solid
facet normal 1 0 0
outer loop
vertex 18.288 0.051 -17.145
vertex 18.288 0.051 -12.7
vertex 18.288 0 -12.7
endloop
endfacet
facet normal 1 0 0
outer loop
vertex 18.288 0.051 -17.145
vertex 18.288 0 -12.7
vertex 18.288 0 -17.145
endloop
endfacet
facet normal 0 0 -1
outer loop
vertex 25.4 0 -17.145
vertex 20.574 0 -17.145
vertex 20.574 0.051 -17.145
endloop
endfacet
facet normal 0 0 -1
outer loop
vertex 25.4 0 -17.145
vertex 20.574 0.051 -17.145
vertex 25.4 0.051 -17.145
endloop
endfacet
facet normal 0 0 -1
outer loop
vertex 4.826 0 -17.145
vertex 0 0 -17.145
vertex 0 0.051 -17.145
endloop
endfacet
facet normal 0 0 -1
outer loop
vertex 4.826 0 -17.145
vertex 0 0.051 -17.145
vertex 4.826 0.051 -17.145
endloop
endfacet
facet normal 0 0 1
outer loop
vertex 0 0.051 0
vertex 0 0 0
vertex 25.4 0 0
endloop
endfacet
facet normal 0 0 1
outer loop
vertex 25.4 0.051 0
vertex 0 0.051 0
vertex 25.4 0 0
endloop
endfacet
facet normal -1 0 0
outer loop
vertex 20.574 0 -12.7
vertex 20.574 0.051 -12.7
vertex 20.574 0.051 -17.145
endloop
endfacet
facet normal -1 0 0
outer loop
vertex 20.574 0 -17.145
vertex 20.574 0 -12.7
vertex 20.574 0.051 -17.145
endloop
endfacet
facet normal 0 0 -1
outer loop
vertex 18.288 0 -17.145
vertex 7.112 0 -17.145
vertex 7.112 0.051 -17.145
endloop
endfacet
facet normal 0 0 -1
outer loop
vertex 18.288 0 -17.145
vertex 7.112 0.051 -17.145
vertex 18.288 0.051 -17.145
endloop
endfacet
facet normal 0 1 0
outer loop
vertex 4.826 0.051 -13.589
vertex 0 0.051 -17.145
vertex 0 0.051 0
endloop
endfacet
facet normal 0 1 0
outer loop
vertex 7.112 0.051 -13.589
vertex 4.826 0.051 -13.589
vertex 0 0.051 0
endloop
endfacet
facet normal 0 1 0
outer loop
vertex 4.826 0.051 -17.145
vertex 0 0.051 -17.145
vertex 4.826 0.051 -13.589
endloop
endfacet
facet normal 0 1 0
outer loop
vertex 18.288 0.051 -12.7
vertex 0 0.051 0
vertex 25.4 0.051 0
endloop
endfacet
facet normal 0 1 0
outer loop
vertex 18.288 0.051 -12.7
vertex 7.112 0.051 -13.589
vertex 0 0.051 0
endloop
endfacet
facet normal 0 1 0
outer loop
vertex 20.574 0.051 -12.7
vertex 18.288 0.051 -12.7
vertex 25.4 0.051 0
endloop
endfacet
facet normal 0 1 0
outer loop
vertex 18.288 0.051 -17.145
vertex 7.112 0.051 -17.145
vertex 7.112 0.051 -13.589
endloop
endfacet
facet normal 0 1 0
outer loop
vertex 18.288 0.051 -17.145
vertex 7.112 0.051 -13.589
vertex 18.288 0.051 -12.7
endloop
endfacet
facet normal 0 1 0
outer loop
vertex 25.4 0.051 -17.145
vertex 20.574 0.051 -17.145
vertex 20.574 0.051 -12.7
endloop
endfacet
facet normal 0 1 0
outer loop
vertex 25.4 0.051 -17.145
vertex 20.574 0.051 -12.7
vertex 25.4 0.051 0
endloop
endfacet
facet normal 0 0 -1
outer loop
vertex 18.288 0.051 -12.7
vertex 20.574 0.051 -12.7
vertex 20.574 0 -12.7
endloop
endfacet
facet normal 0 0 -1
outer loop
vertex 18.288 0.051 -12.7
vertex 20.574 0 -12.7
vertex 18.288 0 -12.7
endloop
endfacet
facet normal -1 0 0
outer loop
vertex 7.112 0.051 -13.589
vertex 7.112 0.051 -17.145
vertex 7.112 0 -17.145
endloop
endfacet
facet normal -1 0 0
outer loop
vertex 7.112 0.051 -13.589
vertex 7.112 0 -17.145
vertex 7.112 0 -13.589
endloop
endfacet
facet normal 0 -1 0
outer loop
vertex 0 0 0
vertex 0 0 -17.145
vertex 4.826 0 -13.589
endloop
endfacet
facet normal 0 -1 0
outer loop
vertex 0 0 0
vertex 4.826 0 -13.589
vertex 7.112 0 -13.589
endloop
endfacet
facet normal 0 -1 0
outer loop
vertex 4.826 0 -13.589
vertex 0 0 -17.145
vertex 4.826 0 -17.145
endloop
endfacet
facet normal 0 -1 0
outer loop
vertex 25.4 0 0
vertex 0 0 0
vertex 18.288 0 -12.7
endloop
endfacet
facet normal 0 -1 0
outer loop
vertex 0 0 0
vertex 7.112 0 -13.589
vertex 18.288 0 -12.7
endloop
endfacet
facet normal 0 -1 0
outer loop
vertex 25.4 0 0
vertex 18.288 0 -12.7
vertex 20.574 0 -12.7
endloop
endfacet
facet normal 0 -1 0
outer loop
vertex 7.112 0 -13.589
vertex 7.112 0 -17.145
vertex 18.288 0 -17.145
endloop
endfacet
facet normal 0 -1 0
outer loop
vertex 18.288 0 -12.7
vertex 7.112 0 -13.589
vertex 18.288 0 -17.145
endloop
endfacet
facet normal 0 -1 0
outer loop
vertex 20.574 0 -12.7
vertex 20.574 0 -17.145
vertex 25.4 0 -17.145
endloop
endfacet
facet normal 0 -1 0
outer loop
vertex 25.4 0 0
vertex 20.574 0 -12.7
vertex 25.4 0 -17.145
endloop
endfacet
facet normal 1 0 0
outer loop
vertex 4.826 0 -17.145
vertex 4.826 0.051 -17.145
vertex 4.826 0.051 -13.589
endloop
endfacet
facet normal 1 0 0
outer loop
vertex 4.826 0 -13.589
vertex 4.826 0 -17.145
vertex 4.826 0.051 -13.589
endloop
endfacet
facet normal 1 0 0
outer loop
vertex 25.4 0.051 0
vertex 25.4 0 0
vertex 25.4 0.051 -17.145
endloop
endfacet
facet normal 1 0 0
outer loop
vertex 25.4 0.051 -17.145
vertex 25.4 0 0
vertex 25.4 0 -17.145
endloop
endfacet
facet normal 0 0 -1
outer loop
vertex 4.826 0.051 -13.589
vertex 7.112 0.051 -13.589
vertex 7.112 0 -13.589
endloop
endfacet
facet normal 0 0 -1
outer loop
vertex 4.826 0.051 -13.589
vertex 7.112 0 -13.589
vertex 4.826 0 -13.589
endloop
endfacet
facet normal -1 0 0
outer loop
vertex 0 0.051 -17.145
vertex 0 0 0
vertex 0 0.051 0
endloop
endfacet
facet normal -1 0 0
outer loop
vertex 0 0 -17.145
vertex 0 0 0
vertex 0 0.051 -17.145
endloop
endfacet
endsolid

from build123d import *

# Parameters (mm, degrees)
SKETCH1_W           = 25.4
SKETCH1_H           = 17.145
BOSS_EXTRUDE1_DEPTH = 0.0508
CUT_EXTRUDE1_DEPTH  = 31.644960526


with BuildPart() as part:
    # Sketch1 → Boss-Extrude1 (new body)
    with BuildSketch(Plane(origin=(0, 0, 0), x_dir=(1, 0, 0), z_dir=(0, 1, 0))):
        with Locations((12.7, 8.5725)):
            Rectangle(SKETCH1_W, SKETCH1_H)
    extrude(amount=BOSS_EXTRUDE1_DEPTH)

    # Sketch2 → Cut-Extrude1 (cut, through all)
    with BuildSketch(Plane(origin=(0, 0.0508, 0), x_dir=(1, 0, 0), z_dir=(0, 1, 0))):
        Polygon((6.0325, 17.145), (7.112, 17.145), (7.112, 13.589), (4.826, 13.589), (4.826, 14.605), (4.826, 17.145), align=None)
        Polygon((18.288, 17.145), (19.3675, 17.145), (20.574, 17.145), (20.574, 13.589), (20.574, 12.7), (18.288, 12.7), align=None)
    extrude(amount=-CUT_EXTRUDE1_DEPTH, mode=Mode.SUBTRACT)


solid = part.part
